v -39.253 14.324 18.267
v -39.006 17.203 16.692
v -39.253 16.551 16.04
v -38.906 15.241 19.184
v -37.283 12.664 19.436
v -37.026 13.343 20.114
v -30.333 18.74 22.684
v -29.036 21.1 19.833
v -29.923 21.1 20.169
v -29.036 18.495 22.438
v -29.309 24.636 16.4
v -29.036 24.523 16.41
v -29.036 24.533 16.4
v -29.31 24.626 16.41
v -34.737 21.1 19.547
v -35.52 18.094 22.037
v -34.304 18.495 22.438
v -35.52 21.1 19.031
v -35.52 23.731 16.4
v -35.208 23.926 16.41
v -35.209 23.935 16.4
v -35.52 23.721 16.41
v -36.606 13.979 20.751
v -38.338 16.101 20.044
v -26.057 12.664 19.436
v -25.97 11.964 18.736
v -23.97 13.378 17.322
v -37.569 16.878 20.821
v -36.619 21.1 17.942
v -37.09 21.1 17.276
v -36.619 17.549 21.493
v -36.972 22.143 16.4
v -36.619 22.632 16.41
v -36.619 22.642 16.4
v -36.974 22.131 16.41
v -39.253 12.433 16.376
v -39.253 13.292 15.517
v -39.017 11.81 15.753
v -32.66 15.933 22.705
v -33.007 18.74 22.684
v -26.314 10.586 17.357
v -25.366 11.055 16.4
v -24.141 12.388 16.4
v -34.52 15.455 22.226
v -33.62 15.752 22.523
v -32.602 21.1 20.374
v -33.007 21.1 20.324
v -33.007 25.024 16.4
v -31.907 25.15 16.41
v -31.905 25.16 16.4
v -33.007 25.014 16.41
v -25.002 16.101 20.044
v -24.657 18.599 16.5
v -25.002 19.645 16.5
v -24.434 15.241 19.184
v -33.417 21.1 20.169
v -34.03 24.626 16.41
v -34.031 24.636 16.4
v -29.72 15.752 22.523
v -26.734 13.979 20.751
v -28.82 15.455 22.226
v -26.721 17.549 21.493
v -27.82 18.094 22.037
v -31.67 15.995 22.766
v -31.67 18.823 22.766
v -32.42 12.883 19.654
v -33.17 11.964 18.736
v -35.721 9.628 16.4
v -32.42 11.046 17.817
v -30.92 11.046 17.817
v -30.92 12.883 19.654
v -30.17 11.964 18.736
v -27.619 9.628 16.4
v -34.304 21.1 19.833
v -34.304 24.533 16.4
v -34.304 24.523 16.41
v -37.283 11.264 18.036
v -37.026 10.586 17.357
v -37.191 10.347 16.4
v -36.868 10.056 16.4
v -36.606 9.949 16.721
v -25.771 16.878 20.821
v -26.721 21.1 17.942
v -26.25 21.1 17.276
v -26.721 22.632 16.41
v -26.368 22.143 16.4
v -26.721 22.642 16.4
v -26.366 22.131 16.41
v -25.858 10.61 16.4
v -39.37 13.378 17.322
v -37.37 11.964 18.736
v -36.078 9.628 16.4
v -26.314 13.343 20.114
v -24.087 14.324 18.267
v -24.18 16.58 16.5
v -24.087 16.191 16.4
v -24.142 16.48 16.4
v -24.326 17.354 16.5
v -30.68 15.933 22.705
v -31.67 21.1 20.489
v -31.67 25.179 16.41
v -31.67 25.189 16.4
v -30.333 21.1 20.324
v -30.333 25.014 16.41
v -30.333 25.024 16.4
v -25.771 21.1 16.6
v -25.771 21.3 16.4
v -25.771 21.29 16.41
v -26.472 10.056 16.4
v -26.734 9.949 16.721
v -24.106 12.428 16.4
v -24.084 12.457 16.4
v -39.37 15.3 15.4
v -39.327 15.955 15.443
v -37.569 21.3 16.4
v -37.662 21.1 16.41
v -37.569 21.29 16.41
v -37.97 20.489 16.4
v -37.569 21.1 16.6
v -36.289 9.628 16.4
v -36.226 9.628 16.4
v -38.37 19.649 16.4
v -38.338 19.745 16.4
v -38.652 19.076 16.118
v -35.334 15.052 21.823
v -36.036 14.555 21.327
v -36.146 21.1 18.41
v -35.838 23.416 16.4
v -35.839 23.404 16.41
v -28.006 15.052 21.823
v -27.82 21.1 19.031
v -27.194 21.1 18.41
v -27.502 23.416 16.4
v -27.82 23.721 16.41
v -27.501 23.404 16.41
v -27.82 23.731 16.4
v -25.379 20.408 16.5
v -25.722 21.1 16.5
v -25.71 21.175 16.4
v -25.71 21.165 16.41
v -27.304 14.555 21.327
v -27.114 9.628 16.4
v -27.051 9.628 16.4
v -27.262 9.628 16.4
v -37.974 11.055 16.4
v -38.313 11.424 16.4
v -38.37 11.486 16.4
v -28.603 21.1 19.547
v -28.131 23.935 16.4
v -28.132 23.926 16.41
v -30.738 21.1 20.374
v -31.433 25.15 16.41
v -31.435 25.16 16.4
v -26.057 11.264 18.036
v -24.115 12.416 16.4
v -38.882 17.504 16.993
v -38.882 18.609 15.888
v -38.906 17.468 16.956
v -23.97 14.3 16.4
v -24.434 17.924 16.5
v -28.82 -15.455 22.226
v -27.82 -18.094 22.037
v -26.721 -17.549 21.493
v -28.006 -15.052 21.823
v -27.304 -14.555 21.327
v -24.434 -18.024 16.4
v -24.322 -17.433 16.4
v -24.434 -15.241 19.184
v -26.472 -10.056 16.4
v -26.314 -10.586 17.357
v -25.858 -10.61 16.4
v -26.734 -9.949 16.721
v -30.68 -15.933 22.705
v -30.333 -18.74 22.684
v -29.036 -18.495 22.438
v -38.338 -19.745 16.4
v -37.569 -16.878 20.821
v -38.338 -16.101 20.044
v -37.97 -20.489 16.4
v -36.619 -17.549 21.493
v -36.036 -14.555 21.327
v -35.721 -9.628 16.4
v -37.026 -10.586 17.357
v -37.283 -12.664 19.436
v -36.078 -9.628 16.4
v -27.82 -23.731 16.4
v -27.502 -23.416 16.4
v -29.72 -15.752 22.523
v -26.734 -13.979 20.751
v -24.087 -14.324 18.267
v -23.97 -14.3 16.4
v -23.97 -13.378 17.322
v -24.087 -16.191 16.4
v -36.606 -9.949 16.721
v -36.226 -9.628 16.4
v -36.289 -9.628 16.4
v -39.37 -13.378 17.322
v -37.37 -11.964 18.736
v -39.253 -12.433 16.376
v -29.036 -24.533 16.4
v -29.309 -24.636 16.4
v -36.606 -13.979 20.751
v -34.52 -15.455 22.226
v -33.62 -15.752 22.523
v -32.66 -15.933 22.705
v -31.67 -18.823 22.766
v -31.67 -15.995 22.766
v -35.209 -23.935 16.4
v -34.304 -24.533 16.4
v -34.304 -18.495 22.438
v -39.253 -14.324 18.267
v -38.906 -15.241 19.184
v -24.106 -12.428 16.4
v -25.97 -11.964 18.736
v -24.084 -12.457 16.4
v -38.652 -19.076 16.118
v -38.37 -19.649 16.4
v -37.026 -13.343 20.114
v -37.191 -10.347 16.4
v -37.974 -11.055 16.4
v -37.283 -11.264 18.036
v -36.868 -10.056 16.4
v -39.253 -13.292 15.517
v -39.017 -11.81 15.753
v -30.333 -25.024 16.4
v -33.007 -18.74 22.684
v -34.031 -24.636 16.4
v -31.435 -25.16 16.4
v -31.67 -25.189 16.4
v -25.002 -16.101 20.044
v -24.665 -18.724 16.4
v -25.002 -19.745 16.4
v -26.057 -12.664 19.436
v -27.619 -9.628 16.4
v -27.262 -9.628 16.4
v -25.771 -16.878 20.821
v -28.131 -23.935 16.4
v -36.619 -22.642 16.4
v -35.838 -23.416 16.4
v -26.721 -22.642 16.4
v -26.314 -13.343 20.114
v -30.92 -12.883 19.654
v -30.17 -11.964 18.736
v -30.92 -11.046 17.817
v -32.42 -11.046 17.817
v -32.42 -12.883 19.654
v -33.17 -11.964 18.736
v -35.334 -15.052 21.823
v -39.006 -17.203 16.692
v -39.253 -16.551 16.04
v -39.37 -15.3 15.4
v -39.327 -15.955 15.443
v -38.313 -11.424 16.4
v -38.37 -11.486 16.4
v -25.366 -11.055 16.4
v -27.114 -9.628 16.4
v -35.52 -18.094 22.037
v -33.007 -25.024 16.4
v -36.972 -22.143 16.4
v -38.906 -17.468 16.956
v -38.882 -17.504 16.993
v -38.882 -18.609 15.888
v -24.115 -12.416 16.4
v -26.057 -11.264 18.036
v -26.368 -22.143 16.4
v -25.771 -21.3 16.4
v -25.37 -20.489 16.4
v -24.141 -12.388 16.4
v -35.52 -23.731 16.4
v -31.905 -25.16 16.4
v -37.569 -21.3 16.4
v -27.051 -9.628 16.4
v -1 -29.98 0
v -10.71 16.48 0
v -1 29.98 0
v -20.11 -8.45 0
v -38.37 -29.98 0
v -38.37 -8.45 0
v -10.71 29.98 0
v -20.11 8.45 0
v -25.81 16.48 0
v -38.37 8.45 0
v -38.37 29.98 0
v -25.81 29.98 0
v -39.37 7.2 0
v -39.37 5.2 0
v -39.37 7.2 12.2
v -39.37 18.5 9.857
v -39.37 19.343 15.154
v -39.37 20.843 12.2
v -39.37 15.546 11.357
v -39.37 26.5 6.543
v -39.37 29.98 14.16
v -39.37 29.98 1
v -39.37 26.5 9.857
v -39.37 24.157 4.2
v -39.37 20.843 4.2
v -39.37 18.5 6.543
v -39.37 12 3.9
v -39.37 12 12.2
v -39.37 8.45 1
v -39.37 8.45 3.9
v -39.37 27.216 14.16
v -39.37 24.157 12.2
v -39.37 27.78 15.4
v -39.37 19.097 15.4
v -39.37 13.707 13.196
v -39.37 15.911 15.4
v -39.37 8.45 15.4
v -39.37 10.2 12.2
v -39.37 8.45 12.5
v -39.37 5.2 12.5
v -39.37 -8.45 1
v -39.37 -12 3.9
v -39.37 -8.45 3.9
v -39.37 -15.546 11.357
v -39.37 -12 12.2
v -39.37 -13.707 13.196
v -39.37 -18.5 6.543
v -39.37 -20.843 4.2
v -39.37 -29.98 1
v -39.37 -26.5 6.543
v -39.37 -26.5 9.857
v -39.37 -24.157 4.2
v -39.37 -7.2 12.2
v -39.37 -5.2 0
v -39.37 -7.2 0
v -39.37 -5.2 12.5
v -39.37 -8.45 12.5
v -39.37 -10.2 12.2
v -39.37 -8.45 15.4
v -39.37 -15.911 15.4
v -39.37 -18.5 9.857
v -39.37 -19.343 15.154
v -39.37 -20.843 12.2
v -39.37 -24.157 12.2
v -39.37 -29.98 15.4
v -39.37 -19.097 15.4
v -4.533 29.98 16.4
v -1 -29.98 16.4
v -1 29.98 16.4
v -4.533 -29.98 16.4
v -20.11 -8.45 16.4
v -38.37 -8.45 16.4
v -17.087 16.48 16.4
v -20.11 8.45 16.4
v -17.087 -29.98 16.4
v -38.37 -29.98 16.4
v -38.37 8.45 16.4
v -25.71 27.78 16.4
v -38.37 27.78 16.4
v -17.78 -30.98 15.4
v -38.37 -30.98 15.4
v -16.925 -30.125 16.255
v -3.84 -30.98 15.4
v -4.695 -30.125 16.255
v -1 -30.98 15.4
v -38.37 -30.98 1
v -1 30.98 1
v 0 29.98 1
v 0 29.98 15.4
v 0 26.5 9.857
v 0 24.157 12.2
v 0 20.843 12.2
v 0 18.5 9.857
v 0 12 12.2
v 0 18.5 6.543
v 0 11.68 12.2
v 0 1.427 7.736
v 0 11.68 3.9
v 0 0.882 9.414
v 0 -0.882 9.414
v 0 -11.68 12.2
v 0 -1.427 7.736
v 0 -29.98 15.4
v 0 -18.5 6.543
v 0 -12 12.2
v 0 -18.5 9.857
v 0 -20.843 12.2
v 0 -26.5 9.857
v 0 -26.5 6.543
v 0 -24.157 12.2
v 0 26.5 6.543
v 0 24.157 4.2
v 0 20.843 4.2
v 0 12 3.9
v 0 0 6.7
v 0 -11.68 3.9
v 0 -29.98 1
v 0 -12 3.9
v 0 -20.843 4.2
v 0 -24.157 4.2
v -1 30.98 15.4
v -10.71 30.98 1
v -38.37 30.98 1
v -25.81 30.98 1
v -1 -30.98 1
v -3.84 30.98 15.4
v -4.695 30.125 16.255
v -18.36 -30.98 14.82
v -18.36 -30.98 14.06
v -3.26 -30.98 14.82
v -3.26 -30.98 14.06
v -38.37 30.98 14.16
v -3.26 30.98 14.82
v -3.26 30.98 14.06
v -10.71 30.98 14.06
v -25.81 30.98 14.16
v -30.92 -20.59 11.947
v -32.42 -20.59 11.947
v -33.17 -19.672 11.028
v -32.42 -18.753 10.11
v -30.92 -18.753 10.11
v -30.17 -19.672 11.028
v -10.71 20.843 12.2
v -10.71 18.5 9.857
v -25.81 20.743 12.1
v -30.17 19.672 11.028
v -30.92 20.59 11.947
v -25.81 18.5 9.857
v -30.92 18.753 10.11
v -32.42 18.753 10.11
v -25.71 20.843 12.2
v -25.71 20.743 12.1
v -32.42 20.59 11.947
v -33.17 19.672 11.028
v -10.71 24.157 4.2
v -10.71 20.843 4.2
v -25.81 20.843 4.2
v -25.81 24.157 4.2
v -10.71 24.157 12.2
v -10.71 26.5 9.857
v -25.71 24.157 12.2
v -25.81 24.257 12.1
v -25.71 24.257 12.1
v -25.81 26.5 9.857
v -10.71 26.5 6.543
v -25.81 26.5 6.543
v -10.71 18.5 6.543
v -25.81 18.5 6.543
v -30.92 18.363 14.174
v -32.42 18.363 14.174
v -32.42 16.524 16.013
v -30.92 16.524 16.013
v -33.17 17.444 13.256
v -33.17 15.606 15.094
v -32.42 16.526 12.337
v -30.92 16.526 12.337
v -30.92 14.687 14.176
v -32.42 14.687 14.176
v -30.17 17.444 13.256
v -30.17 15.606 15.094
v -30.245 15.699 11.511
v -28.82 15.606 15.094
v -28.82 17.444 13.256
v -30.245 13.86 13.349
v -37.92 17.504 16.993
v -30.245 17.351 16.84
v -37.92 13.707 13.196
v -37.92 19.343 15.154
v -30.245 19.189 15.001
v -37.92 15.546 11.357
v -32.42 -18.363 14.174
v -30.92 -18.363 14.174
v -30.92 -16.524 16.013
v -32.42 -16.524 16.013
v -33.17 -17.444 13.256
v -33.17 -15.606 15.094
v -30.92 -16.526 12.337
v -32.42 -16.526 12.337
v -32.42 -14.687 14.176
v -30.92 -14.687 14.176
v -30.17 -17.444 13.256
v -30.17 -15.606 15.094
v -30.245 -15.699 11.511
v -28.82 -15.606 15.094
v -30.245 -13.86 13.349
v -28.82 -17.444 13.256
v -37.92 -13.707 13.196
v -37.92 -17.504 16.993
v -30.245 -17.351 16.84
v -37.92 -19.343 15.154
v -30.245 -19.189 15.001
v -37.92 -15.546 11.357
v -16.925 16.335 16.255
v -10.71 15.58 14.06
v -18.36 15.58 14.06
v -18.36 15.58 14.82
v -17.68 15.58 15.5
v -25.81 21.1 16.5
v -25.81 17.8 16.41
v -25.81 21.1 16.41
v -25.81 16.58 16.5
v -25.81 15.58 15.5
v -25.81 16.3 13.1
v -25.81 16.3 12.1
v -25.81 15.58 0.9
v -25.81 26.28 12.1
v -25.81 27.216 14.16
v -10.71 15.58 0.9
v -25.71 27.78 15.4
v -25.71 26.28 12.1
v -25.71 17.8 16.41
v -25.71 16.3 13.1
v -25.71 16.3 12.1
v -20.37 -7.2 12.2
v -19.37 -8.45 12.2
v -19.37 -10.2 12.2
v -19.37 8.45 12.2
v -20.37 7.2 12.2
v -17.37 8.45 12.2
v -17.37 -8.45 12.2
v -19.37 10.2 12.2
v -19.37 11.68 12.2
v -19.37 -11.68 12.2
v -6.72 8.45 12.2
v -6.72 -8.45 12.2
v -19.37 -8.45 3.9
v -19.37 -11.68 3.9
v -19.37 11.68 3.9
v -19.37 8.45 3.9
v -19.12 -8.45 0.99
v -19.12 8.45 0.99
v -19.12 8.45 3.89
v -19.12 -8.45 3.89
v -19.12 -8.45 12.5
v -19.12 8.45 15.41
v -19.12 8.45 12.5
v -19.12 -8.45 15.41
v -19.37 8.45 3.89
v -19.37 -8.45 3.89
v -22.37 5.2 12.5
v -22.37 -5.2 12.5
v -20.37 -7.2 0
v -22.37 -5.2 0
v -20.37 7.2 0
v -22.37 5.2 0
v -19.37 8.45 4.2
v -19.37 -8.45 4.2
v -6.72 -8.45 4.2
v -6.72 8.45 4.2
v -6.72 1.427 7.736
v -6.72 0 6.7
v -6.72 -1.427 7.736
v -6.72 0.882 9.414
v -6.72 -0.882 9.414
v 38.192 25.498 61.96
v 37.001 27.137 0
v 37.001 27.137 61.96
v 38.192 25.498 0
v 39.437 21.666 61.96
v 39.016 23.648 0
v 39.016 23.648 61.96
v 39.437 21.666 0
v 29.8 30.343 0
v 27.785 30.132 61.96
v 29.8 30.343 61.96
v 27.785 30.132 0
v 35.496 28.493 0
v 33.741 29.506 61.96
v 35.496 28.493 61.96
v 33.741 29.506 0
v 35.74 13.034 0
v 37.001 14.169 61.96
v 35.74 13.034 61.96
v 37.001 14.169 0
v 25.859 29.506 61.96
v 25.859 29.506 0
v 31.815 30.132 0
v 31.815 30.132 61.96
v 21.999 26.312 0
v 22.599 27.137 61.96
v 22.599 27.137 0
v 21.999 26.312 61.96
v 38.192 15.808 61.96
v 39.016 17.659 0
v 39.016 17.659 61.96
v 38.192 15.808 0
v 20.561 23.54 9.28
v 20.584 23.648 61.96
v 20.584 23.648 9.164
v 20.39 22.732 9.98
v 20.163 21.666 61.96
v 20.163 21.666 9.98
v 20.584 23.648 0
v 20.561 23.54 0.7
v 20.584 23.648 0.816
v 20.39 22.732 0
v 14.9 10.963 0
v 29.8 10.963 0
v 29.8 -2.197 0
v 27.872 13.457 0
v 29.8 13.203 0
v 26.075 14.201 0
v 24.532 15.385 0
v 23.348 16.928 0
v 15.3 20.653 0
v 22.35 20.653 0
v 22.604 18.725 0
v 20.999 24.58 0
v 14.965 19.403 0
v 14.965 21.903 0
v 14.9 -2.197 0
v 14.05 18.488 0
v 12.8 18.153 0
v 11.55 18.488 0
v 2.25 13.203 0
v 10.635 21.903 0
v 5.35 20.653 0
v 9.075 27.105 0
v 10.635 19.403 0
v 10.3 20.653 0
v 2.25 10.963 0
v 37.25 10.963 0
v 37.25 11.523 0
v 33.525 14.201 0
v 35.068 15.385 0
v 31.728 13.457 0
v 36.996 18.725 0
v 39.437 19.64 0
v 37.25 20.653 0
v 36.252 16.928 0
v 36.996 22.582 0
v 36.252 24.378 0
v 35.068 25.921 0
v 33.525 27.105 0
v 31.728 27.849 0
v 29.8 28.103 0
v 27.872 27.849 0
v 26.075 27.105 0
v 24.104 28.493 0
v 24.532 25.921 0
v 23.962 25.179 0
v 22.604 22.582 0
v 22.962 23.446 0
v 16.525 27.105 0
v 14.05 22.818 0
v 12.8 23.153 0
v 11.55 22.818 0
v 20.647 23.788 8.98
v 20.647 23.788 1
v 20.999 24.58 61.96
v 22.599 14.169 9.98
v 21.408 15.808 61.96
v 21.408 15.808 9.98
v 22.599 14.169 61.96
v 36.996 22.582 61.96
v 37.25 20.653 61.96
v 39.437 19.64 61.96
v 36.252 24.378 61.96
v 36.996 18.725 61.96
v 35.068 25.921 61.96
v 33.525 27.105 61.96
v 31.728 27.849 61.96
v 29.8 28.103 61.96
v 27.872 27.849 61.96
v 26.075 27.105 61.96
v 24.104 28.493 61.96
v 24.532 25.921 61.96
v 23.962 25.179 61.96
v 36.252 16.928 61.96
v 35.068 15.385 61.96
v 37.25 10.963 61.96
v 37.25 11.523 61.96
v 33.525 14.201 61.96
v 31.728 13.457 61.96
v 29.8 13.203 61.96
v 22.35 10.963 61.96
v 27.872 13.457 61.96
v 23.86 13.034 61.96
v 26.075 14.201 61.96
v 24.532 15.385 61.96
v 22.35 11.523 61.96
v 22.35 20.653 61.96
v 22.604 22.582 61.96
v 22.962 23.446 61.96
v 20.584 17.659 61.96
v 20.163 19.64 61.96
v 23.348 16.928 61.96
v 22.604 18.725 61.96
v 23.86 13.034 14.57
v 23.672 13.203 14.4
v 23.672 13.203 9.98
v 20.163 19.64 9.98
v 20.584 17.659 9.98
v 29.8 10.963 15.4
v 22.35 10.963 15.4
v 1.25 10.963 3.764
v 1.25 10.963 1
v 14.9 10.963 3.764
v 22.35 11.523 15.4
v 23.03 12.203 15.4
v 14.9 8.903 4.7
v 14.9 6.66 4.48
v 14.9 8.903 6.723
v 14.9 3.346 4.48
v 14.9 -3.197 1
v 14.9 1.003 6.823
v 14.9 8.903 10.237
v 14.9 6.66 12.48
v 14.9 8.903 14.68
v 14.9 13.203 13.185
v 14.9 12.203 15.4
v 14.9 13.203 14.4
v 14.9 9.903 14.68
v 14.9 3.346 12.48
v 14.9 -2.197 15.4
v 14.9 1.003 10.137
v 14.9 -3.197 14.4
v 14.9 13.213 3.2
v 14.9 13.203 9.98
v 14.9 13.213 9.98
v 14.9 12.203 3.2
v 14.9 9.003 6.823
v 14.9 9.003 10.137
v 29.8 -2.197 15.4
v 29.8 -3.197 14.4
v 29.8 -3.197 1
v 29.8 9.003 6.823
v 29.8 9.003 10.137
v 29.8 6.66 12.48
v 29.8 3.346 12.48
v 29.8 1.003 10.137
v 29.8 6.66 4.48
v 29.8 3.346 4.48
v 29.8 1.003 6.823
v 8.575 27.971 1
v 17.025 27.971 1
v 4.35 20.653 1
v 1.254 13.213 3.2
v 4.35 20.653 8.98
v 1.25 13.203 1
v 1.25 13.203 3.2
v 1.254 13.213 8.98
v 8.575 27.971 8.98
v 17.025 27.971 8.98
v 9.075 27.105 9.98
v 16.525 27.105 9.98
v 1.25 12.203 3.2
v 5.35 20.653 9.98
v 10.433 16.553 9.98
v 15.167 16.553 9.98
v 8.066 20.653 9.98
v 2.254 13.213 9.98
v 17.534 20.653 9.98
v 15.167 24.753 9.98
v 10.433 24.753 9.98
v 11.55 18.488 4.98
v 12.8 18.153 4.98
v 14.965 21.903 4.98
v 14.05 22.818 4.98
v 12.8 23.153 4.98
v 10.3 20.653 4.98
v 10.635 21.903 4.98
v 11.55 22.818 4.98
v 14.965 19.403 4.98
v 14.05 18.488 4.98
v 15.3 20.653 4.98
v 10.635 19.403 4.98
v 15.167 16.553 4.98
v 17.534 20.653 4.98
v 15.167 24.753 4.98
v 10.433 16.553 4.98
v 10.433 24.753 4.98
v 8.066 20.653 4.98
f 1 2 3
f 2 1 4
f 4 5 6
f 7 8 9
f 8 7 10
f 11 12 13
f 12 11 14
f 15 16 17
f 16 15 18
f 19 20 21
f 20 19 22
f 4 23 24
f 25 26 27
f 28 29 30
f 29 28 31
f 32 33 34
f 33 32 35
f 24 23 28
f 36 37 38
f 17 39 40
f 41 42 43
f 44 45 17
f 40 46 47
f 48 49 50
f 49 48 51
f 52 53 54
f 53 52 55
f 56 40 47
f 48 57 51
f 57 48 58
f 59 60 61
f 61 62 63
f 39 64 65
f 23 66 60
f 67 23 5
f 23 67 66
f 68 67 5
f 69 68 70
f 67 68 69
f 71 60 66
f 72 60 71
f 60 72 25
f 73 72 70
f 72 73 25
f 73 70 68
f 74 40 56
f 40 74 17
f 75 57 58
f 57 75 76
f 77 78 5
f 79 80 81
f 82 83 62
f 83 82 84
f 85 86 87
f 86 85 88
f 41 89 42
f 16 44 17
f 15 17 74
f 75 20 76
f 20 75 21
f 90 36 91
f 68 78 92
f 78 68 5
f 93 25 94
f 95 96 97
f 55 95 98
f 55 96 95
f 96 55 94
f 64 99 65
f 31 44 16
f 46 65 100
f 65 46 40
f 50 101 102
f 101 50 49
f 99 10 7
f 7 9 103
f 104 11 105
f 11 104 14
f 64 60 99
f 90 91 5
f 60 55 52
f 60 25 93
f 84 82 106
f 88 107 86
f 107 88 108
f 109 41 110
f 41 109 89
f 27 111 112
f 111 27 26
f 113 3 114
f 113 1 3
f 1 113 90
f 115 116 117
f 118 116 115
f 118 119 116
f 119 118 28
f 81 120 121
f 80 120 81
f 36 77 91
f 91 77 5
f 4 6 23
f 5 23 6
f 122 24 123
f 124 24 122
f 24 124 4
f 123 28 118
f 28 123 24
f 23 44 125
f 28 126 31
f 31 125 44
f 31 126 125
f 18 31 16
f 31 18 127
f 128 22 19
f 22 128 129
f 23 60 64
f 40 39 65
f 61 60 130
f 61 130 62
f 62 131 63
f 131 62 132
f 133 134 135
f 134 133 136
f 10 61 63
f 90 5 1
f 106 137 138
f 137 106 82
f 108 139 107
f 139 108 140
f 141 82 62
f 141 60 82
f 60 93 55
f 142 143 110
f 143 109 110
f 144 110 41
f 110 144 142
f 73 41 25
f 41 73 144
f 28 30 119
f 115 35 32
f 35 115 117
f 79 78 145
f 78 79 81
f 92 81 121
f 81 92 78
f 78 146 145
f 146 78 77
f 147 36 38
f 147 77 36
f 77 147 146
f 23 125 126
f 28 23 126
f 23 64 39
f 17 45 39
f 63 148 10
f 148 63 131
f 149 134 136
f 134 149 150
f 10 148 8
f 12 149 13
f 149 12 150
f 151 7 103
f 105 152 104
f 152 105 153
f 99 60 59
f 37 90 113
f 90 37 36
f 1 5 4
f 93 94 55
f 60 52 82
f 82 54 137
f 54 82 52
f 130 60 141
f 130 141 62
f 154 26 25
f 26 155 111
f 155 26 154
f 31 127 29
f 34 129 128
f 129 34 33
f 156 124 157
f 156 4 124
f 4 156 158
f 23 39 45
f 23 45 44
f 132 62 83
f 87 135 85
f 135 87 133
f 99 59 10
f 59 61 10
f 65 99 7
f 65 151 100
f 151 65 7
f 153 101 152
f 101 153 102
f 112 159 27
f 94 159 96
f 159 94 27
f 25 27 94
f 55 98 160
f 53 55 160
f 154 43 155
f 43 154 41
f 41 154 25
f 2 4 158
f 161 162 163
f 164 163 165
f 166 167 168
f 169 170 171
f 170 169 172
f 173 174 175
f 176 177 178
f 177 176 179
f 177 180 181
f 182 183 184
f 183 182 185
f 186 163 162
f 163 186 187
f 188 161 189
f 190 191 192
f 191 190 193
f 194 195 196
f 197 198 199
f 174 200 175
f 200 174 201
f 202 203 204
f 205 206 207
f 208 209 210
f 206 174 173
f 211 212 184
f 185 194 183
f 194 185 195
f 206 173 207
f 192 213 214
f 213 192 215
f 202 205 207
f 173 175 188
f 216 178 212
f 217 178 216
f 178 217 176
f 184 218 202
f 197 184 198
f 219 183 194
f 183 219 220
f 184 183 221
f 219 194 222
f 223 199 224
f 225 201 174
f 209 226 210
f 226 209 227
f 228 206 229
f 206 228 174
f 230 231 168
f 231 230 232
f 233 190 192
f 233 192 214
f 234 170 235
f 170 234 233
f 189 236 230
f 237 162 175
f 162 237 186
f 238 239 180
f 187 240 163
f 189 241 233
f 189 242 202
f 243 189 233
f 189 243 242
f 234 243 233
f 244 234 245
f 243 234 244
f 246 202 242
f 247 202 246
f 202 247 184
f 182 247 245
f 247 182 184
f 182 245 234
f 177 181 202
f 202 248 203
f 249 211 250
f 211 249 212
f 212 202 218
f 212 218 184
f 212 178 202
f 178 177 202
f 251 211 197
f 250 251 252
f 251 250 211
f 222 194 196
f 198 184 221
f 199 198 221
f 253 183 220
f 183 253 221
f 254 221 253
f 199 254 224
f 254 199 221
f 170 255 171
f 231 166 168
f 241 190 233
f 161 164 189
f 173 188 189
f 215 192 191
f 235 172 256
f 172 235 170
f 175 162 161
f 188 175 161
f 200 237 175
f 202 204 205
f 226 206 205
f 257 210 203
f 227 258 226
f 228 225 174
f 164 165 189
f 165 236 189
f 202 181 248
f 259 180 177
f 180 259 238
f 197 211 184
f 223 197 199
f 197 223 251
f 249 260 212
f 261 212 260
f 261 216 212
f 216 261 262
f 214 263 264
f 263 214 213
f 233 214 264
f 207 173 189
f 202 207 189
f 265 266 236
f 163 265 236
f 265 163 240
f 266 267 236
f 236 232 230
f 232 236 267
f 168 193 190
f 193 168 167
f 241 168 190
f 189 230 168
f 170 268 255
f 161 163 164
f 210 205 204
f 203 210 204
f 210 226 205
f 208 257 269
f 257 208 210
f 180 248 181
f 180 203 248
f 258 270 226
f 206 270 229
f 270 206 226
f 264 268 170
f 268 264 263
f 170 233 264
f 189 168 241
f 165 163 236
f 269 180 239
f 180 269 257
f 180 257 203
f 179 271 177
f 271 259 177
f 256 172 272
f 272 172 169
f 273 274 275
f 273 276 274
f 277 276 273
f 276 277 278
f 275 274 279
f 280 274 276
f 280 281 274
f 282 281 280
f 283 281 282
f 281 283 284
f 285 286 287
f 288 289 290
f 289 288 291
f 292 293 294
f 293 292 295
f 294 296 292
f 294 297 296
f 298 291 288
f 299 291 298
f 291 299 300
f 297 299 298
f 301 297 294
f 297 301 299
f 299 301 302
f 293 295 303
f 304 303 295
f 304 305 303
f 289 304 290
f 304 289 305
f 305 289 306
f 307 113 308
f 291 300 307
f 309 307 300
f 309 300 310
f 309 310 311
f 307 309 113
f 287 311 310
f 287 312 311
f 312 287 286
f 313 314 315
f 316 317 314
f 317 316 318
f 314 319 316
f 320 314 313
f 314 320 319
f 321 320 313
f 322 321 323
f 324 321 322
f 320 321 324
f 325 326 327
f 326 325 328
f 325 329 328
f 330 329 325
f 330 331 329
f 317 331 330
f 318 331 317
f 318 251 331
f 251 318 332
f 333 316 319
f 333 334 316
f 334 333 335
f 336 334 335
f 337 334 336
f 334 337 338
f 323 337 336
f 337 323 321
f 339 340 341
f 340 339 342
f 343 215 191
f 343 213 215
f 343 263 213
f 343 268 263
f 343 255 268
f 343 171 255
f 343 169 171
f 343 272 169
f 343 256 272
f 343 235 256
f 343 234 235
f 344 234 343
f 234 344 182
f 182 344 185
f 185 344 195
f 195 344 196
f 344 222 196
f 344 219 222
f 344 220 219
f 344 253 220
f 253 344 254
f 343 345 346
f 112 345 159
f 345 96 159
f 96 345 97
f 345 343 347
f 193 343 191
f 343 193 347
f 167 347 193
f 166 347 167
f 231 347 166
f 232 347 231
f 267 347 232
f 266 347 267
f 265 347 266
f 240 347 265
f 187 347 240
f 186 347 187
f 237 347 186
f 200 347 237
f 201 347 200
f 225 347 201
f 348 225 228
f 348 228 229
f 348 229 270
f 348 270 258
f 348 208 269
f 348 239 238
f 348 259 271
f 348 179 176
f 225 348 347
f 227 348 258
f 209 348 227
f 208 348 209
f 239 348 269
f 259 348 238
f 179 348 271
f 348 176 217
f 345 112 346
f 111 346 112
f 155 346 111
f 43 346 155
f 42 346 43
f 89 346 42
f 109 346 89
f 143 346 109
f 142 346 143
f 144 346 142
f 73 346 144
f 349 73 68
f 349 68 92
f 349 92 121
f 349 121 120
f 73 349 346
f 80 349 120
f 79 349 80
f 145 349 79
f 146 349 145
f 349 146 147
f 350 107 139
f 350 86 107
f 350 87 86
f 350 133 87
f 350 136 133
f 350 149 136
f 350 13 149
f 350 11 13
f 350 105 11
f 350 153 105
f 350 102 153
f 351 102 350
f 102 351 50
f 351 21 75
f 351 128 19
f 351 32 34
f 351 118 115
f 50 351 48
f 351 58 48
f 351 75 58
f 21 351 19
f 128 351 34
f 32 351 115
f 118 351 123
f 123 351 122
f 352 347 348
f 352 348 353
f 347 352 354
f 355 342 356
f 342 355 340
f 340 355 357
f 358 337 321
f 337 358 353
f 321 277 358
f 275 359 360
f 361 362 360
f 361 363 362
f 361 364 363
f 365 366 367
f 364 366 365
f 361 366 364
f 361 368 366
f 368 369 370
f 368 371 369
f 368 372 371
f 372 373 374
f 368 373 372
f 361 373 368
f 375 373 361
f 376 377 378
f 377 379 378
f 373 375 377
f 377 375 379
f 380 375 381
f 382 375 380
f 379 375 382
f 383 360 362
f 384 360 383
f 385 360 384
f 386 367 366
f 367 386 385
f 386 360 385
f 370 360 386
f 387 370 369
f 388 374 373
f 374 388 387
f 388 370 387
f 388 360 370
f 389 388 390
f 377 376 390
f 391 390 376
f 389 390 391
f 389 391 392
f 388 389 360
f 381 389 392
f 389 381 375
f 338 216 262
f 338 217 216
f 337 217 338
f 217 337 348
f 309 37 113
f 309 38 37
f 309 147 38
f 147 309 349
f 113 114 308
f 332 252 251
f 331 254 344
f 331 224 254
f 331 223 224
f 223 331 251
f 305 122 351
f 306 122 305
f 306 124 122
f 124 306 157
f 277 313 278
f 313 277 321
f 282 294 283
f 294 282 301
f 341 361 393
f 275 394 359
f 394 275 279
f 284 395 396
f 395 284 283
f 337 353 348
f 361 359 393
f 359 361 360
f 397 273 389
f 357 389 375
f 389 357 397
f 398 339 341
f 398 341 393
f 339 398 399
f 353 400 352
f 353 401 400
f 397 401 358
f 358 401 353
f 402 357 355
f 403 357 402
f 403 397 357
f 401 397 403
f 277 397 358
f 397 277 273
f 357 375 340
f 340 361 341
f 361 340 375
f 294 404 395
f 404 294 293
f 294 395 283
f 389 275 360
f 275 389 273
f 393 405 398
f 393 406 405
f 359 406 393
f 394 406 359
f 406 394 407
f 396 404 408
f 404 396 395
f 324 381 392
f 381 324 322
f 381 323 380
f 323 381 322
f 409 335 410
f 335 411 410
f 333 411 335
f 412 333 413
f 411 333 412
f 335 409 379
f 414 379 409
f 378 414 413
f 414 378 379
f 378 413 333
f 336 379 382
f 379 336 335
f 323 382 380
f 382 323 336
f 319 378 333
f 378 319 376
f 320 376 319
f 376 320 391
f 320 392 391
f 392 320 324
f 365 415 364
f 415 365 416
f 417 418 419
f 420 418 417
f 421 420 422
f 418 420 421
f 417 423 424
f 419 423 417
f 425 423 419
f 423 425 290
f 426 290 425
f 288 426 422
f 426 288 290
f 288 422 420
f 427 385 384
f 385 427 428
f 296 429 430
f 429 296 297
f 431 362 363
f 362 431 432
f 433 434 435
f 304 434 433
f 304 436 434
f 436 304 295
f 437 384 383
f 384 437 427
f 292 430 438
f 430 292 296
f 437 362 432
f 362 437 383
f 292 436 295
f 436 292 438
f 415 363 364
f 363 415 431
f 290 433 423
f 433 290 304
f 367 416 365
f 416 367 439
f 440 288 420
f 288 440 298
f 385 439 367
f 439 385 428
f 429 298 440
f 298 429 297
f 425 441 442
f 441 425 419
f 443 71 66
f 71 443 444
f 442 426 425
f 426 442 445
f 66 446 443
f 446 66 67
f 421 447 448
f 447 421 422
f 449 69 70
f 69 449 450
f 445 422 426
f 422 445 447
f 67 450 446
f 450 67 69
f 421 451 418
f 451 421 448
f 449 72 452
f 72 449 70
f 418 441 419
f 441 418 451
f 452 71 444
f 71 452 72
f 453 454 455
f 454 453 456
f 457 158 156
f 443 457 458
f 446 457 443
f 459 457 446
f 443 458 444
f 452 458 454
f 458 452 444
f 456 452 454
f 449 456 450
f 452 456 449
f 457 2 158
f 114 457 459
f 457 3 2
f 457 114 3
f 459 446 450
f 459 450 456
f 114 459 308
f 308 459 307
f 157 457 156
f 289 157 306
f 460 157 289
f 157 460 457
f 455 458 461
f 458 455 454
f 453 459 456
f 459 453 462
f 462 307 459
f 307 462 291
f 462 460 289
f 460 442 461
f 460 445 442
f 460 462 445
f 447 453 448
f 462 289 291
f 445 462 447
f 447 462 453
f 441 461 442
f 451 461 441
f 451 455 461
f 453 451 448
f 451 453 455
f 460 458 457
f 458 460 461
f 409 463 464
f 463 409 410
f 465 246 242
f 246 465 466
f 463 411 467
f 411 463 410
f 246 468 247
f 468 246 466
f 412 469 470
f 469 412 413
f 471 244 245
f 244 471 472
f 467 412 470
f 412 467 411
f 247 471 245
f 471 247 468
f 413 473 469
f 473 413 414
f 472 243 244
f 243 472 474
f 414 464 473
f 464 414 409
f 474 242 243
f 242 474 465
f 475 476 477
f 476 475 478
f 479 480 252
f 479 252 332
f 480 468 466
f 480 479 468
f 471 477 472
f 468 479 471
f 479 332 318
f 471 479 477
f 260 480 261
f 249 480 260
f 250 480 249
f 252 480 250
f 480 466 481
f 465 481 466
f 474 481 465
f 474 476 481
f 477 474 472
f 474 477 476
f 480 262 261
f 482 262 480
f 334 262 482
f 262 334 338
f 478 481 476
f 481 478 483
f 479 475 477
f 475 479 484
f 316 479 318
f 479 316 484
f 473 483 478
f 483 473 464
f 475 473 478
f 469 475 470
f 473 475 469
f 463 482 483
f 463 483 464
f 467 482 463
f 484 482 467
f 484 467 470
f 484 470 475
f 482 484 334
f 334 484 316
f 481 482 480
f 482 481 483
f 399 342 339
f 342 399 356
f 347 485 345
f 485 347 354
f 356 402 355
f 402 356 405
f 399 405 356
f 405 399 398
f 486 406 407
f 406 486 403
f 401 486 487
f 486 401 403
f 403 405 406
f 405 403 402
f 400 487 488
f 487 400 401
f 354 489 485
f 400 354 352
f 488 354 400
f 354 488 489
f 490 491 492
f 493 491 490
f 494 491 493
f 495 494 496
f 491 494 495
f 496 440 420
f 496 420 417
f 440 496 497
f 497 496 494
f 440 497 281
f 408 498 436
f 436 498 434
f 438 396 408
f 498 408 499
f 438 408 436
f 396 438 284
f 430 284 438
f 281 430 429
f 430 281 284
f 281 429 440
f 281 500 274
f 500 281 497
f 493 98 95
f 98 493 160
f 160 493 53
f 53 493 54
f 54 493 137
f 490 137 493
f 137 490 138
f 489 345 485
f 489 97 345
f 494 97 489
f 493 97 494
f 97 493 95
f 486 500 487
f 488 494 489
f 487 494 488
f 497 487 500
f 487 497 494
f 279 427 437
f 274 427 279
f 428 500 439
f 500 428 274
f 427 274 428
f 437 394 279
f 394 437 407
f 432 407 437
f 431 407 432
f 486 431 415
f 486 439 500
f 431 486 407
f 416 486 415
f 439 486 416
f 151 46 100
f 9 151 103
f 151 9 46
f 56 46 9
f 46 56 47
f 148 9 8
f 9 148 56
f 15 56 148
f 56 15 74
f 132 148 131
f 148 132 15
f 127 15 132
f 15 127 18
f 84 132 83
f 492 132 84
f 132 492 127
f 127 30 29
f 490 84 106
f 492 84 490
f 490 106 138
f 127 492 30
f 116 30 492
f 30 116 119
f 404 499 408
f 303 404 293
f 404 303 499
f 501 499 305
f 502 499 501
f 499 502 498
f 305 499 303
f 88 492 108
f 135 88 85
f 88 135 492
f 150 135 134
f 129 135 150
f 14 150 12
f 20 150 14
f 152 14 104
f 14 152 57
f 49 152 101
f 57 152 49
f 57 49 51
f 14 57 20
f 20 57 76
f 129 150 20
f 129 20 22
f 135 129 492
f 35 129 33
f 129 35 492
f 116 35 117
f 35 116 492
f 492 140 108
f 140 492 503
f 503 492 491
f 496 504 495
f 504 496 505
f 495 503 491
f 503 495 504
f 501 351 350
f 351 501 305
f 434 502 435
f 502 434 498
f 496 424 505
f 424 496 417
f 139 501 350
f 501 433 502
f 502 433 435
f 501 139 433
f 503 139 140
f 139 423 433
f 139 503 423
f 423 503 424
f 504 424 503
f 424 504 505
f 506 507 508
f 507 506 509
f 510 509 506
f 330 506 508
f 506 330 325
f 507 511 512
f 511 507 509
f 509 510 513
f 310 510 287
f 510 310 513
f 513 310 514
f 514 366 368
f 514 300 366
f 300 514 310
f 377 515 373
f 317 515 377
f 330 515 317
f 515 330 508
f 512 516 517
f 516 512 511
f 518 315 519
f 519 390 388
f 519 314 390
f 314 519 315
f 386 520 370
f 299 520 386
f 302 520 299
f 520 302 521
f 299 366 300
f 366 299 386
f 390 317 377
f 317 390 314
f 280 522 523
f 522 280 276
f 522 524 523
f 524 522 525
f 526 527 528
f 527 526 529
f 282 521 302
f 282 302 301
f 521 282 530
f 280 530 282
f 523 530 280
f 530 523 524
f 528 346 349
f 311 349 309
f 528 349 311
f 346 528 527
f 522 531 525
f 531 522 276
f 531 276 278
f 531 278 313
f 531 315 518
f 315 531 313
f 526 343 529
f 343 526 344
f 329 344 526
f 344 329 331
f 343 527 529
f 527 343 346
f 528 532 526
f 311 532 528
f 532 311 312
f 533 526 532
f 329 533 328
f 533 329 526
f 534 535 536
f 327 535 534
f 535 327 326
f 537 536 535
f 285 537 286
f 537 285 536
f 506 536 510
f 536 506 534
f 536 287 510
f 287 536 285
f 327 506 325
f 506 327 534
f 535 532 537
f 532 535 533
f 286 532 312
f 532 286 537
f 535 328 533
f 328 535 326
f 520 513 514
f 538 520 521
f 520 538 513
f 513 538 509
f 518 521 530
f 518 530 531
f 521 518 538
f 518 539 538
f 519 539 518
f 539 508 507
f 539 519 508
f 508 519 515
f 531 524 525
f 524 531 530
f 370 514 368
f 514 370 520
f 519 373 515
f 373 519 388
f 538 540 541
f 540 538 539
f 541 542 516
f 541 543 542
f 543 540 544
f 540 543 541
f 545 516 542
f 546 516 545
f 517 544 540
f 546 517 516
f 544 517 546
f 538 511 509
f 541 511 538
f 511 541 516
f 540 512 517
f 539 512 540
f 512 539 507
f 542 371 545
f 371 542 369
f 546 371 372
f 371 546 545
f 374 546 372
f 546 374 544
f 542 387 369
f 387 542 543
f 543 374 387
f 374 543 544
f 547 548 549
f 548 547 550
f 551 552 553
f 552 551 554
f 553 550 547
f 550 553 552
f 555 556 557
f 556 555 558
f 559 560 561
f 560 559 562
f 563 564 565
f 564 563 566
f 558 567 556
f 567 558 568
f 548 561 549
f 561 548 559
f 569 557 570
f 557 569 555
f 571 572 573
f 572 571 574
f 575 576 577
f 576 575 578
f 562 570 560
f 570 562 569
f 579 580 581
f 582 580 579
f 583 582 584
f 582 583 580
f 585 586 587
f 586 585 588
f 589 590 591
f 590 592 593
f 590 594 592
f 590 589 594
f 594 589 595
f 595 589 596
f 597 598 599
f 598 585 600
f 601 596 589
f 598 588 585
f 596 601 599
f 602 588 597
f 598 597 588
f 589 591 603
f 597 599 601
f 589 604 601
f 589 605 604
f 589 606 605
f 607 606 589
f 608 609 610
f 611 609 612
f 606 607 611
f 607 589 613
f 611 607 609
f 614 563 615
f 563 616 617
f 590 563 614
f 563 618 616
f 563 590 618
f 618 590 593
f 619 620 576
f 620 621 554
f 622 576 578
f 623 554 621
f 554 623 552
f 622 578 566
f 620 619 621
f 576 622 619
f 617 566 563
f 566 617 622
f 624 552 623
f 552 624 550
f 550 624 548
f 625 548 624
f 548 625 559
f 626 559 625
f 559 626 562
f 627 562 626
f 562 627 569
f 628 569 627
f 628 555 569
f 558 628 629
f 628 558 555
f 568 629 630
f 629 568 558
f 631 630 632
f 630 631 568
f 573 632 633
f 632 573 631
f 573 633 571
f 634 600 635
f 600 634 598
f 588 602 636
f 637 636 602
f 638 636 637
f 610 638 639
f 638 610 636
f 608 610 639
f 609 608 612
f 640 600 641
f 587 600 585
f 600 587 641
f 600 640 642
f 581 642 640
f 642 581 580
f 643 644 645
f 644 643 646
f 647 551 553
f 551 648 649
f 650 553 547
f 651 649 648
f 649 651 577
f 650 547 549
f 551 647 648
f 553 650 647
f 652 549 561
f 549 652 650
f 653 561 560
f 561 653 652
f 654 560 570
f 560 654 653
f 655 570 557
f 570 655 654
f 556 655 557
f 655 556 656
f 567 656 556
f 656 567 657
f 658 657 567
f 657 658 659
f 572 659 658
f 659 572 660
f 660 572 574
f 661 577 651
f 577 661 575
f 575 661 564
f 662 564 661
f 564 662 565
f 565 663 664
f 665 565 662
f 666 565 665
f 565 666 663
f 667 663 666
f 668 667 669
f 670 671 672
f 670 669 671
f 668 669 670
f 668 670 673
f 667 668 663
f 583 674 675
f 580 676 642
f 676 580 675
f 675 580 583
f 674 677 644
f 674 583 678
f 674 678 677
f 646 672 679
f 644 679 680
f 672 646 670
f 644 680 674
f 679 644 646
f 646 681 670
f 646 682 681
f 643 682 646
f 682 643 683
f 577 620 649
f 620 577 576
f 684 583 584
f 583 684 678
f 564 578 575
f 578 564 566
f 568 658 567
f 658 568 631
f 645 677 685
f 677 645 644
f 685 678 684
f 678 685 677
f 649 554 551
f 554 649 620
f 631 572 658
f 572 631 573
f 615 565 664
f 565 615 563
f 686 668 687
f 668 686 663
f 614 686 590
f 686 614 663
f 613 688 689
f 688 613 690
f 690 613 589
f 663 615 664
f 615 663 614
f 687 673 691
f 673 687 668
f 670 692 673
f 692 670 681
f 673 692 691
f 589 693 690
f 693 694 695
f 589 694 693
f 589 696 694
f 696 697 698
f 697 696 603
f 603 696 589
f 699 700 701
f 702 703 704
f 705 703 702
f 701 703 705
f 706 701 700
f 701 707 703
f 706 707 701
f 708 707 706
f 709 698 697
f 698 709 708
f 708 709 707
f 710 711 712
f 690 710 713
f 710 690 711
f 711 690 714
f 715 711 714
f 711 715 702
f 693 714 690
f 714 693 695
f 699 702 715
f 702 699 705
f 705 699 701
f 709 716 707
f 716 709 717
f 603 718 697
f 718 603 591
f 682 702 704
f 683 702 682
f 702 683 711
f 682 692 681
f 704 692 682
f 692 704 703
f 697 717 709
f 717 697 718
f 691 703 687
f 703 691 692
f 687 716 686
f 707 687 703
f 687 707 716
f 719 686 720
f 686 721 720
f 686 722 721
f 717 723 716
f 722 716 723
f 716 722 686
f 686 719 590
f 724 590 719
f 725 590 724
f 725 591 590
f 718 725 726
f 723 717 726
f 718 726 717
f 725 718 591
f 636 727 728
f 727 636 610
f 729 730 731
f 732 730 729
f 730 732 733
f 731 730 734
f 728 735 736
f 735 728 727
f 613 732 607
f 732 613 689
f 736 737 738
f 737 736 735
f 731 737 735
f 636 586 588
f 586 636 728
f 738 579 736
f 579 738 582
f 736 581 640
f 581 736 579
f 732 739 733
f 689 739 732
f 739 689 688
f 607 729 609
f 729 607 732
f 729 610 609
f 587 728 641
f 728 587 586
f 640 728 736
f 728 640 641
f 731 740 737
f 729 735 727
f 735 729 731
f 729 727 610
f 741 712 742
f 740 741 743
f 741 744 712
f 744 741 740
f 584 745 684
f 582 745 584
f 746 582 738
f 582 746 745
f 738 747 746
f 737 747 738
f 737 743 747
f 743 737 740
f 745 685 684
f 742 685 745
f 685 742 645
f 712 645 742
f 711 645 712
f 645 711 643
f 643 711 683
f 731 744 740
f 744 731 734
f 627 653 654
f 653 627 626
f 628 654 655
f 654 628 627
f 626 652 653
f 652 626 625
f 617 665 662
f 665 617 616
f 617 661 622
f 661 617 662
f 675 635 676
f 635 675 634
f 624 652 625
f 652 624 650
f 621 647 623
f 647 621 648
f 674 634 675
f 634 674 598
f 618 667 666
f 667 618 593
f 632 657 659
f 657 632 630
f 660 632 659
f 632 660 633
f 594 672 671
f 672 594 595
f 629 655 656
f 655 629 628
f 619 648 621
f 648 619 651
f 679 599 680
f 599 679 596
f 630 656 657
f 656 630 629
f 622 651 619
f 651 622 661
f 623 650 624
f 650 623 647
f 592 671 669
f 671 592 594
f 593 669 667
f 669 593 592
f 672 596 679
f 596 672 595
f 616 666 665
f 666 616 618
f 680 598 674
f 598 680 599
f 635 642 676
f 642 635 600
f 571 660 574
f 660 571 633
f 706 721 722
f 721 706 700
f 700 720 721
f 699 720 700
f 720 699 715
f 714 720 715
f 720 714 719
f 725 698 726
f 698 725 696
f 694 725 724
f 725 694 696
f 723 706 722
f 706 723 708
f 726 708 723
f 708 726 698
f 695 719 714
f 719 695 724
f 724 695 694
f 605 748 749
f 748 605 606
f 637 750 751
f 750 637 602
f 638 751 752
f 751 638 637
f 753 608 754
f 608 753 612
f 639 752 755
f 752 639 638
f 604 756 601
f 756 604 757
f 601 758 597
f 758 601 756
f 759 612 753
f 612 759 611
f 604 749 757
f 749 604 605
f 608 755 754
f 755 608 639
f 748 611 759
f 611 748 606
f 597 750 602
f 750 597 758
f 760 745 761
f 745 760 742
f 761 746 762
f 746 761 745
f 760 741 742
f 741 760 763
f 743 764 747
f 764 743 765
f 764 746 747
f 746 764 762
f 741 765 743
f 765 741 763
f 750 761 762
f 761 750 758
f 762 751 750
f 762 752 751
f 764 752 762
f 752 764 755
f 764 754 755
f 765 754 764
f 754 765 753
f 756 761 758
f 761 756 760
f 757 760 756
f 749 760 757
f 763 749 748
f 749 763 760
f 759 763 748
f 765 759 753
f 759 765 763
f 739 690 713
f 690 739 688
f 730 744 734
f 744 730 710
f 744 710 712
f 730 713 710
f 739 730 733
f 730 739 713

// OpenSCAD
//////////////////////////////////////////////////////////////////////////////////////
///
///  I3XENDS - Split X-Ends for Prusa i3, with Endstop and Belt Tensioner
///
///  This file contains a redesign of the X-ends for the Prusa i3, including
///  motor end, idler end with belt tensioner and endstop.
///
///  The design goal is to make the X-ends stronger by splitting them into two
///  interlocking parts, printing the Z-axis related part vertically and the
///  X-axis relating part rotated 90 degrees to the back.  This way, each part
///  is printed in its optimal position, resulting in improved object strength
///  and reduced printing difficulties, such as warping and cracking. The two
///  part are joined by means of a trapezoidal slide and are locked firmly
///  together once the upped X-rod is inserted.
///
///  The idler bearing is mounted on a configurable fork which also acts as a
///  belt tensioner, being attached to the left X-end by means of an ajuster bolt.
///  Idler forks for the following bearing are predefined:
///     2x623ZZ, 2x604ZZ, 2x624Z, 2x625ZZ, 1x608ZZ
///
///  The motor X-end contains has the option for integrating a Z-endstop adjustment
///  screw.
///
///  Finally, the X-endstop holder is implemented a separate object which slides
///  on boths X-rods and is maintained firmly in its position bt means of two locking
///  screws.
///
///  The rod channels and screw holes are defined to be tight.  Use a drill with
///  the corresponding diameter to obtain perfectly fitting cavities.
///
//////////////////////////////////////////////////////////////////////////////////////
///
///  2014-10-24 Heinz Spiess, Switzerland
///
///  released under Creative Commons - Attribution - Share Alike licence (CC BY-SA)
//////////////////////////////////////////////////////////////////////////////////////

// extrusion specific parameters
ew = 0.56;    // extrusion width
eh = 0.3;    // layer height
epsgap = 0.1; // gap between complementing parts
wall = [6*ew, 8*ew, 14*eh, 4*ew]; // wall thickness x/y/z/lm8uu


// build a cube with chamfered edges
module chamfered_cube(size,d=[1,1,1]){
   hull(){
     translate([d[0],d[1],0])cube(size-2*[d[0],d[1],0]);
     translate([0,d[1],d[2]])cube(size-2*[0,d[1],d[2]]);
     translate([d[0],0,d[2]])cube(size-2*[d[0],0,d[2]]);
   }
}


// build a cylinder with chamfered edges
module chamfered_cylinder(r=0,r1=0,r2=0,h=0,d=1){
   hull(){
      translate([0,0,d])cylinder(r1=(r?r:r1),r2=(r>0?r:r2),h=h-2*d);
      cylinder(r1=(r?r:r1)-d,r2=(r>0?r:r2)-d,h=h);
   }
}


//////////////////////////////////////////////////////////////////////////////////////
///
///  The module i3_xend() contains all parts of the project as sub-modules. 
///  (This is convenient since this way, the parameters can easily be shared.)
///
//////////////////////////////////////////////////////////////////////////////////////
module i3_xend(motorend=true, idlerend=false, idler=false, bearing=[5,17,11], endstop=false, zcarriage=true, support=true, idlerclamps=false){
xdist = 45;   // distance between x-rods
xrod = 8;     // diameter of x-rods
lm8uu = 14.9;   // diameter of linear bearing;


motor_d = 42; // motor side length (Nema 17)
motor_s = 31; // motor mounting screws spacing

madj = 2.5;   // screw hole for adjuster screw (cut thread with M3 tap)
m3 = 3;       // motor screw diameter
m3n = 5.5;    // M3 nut diameter
m3nh = 2.5;   // M3 nut height
m5 = 5;       // threaded z-rod diameter
m5n = 8.2;    // nut size on threaded x-rod (not too tight!)
m5nh = 5;     // nut height on threaded x-rod
zsrod = 8;    // diameter of smooth z-rod
ztrod = 5;    // diameter of threaded z-rod
zdist = motor_d/2-zsrod/2; // center-to-center distance between z-rods

idl = 20;     // idler length
idg = 0.25;   // gap for idler
ids = m3;      // idler tensioning screw diameter
idn = m3n;    // idler nut diameter
idnh = m3nh;   // idler nut height

xgap = 10-wall[0]-(lm8uu-xrod)/2;    // gap between x-motor and wall

esl = 15;     // endstop length (along x-rods)
esd = 9.5;    // endstop switch screw distance

//  don't change the following, they are just to make code more readble
ml1 = motor_d+xgap;                    // upper length of motor end left of origin
ml2 = lm8uu/2+2*wall[0]+zdist+m5n;      // length of motor end right of origin
ml3 = motor_d/2-motor_s/4-m3+xgap;      // lower length of motor end left of origin
mlz = wall[0]+lm8uu/2;                  // x-position of smooth zrod
d1 = 2*wall[2]+xrod;                    // height of main body
d2 = wall[2]+xrod-1;                    // height of motor base
h1 = xdist+2*wall[1]+xrod;              // total height

itl = ml2-idl-2*wall[0];                // idler tail length
idh = d1;     // idler height
ith = d1;                               // idler tail height
idd = d1;   // idler depth
idc = d1-1;
idca = -45;


///////////////////////////////////////////////////////////////////////////////
// local module for the interlocking Z-carriage part for motor and idler end
///////////////////////////////////////////////////////////////////////////////
module zcarriage(hole=true,l=h1,eps=0){
   translate([0,0,-eps])difference(){
      union(){
         // outer cylinder for linear bearing holder
         cylinder(r=lm8uu/2+wall[3]+eps,h=l+2*eps);
	 // locking rail
         hull(){
            translate([-lm8uu/2-wall[3]-eps,-lm8uu/2-eps,0])cube([ew+2*eps,lm8uu+2*eps,l+2*eps]);
            translate([-lm8uu/2-eps,-lm8uu/2+wall[3]-eps,0])cube([ew+2*eps,lm8uu-2*wall[3]+2*eps,l+2*eps]);
         }
	 // upper x-rod lock
         translate([-lm8uu/2-d1-eps,-lm8uu-eps,0-eps])chamfered_cube([d1+2*eps,lm8uu+2*eps,d1-1+2*eps],[1,0,1]);
	 // nut holder for threaded z-rod
	 hull(){
	   translate([0,-zdist,0])rotate(30)chamfered_cylinder(r=lm8uu/2+1,h=h1/2-motor_d/2,$fn=6);
	   translate([-lm8uu/2-wall[3],-ml2+mlz-eps+0.01,0])chamfered_cube([wall[3],ml2-mlz+2*eps,h1/2-motor_d/2],[0,1,1]);
	 }
      }
      // lock for nut holder
      hull(){
         translate([-lm8uu/2-wall[2]-0.1,-ml2+mlz,wall[2]+0.5+eps])cube([1,ml2-mlz-lm8uu,h1/2-motor_d/2],[0,1,1]);
         translate([-lm8uu/2-1,-ml2+mlz-1,wall[2]-1+eps])cube([1.01,ml2-mlz-lm8uu+1,h1/2-motor_d/2],[0,1,1]);
      }
      // cavities
      if(hole){
         // cavity for linear bearings
         translate([0,0,-1])cylinder(r=lm8uu/2,h=l+2);
	 // longitudinal cutout to allow flexing
         rotate(210)translate([-1,0,-1])cube([2,lm8uu/2+wall[3]+0.1,l+2]);
	 // x-rod hole throu x-rod lock
         translate([-lm8uu/2-d1/2,1,wall[1]+xrod/2])rotate([90,0,0])rotate(22.5)cylinder(r=xrod/2/cos(22.5),h=lm8uu+2,$fn=8);
	 // hole for threaded z-rod
	 //%color("grey")translate([0,-zdist,-1])cylinder(r=m5/2,h=h1+2,$fn=12);
	 translate([0,-zdist,-1])cylinder(r=m5/2,h=h1/2-motor_d/2+2,$fn=12);
	 // nut cavity for threaded z-rod
	 translate([0,-zdist,h1/2-motor_d/2-m5nh])rotate(30)cylinder(r=m5n/2/cos(30),h=m5nh+1,$fn=6);
      }
   }
}


///////////////////////////////////////////////////////////////////////////////
// local module to build the base of the motor end
///////////////////////////////////////////////////////////////////////////////
module motorend(){
difference(){
union(){
difference(){
   union(){
      // main body upper part
      hull(){
         translate([-ml1,-1,0])
            chamfered_cube([ml1+ml2,h1/2+1,d2]);
         translate([-ml3,-1,0])
            chamfered_cube([ml3+ml2,h1/2+1,d1]);
      }
      // main body lower part
      translate([-ml3,-h1/2,0])
         chamfered_cube([ml3+ml2,h1/2+2,d1]);
      // z-adjuster screw base
      if(endstop)
         hull()for(xz=[[0,d1/2,6],[0,d1+lm8uu/2,36],[10,d1-5,6]])
            translate([-motor_d/2-xgap+motor_s/2+xz[0],-h1/2,xz[1]])rotate([-90,0,0])
               chamfered_cylinder(r=motor_s/2-motor_s/4-m3,h=h1/2-motor_d/2,$fn=xz[2]);

   }

   for(sy=[-1,1])scale([1,sy,1]){
      // x-rod holes
      translate([0,xdist/2,d1/2])rotate([0,90,0])rotate(22.5)cylinder(r=xrod/2/cos(22.5),h=ml2+1,$fn=8);
      // holes for motor screws
      for(fx=[-1,1])translate([-xgap-motor_d/2+fx*motor_s/2,motor_s/2,-1]){
         // main screw holes
         cylinder(r=m3/2,h=d2+1,$fn=6);
         // cavities for screw heads
	 translate([0,0,7]) cylinder(r=m3,h=d1+2,$fn=12);
      }
   }
   
   // main belt channel 
   translate([-motor_d-xgap-1,-motor_d/4,wall[2]])
      cube([motor_d+xgap+ml2+2,motor_d/2,xrod]);
   hull(){
      translate([-xgap-wall[0],-motor_d/4,wall[2]])
         cube([xgap+ml2+2,motor_d/2,xrod]);
      translate([0,-motor_s/2+2,wall[2]])
         cube([ml2+2,motor_s-4,xrod]);
   }
   // upper motor cavity
   translate([-motor_d-xgap-1,-motor_d/2,d2])
      cube([motor_d+xgap,motor_d,wall[2]+2]);
   //main cutout for motor
   translate([-motor_d-xgap-1,-motor_d/4,-1])
      cube([motor_d,motor_d/2,wall[2]+xrod+2]);
   // octogonal cutout centered on motor axis
   translate([-xgap-motor_d/2,0,0])hull()for(a=[0,90])rotate(a)
      cube([motor_d/2,motor_s-2,motor_d],true);

    // Z-adjuster screw hole
    if(endstop)
       translate([-motor_d/2-xgap+motor_s/2,-h1/2,d1+lm8uu/2])rotate([-90,0,0])
          translate([0,0,-1])cylinder(r=madj/2,h=h1/2+wall[1]-motor_d/2+2,$fn=6);
}
 
    // belt separating wall 
    translate([0,-wall[1]/2,0])chamfered_cube([ml2,wall[1],d1]);
}
   // cutout for linear bearings holder
    translate([wall[0]+lm8uu/2,h1/2,d1+lm8uu/2])rotate([90,0,0])
       rotate(90){
          zcarriage(hole=false,eps=epsgap);
          if(!support)%color("cyan")zcarriage(hole=true);
       }

}

    if(zcarriage)translate([-motor_d+xgap,0,0])rotate(90)
       zcarriage(hole=true);
}

///////////////////////////////////////////////////////////////////////////////
// local module to build the idler fork for the specified bearing parameters
//    bearing[0]   inner diameter (axis)
//    bearing[1]   outer diameter (incl. belt)
//    bearing[2]   width of bearing (incl. washers)
///////////////////////////////////////////////////////////////////////////////
module idler(){
   assign(idD = bearing[2]+2*wall[2])
   assign(idE = bearing[1]/2)
   difference(){
      union(){
         // main body
	 hull(){
            translate([0,-idd/2,0])chamfered_cube([idl,idd,idh]);
            translate([-idE-2,-idD/2,0])chamfered_cube([idl/2+idE,idD,idh]);
	    // front end
            translate([-idE+1,-idD/2,idh/2])rotate([-90,0,0])rotate(0)chamfered_cylinder(r=idh/2,h=idD);
	 }
	 // tail
         translate([0,-idd/2+wall[2]+epsgap,0])chamfered_cube([ml2-2*wall[0],idd-2*wall[2]-2*epsgap,idh]);
      }
      // hole tensioning screw
      translate([-1,0,d1/2])rotate([0,90,0])rotate(30)cylinder(r=ids/2,h=ml2+2,$fn=6);
      // axis hole
      translate([-idE+bearing[0]/2,-idD/2-1,d1/2])rotate([-90,0,0])cylinder(r=bearing[0]/2,h=idD+2);
      hull(){
         // bearing cavity 
         translate([-idE+2,-bearing[2]/2,d1/2])rotate([-90,0,0])cylinder(r=max(bearing[1],idh/cos(30)+2)/2,h=bearing[2]);
         // main cavity
         translate([-idd-1,-idd/2+wall[1],-1])chamfered_cube([idd+idl-wall[0]+1,idd-2*wall[1],idh+2]);
      }
      // tensioning nut cage
      hull()for(y=[0,xrod])translate([(idl+ml2-3*wall[1])/2,y,d1/2])rotate([0,90,0])
         rotate(30)cylinder(r=idn/2/cos(30)+(y?0.4:0),h=idnh,$fn=6);
   }
     
}

///////////////////////////////////////////////////////////////////////////////
// local module to build the idler X-end
///////////////////////////////////////////////////////////////////////////////
module idlerend(){
   difference(){
      union(){
         // main body
         translate([0,-h1/2,0]) chamfered_cube([ml2,h1,d1]);
	 // idler clamp screws
	 if(idlerclamps)for(sy=[-1,1])scale([1,sy,1]){
	     translate([ml2-idc/2,-xdist/2,d1/2])rotate([idca,0,0])chamfered_cylinder(r=idc/2,h=d1/2+m3nh+wall[2],d=2,$fn=36);
	 }
      }
   
      for(sy=[-1,1])scale([1,sy,1]){
         // x-rod holes
         translate([-1,xdist/2,d1/2])rotate([0,90,0])rotate(22.5)cylinder(r=xrod/2/cos(22.5),h=ml2+2,$fn=8);
      }
      
      // idler clamp screw
      if(idlerclamps)for(sy=[-1,1])scale([1,sy,1])
         translate([ml2-idc/2,-xdist/2,d1/2])rotate([idca,0,0]){
           // idler clamp screw head cavity (if needed)
	   cylinder(r=m3/2,h=d1/2+m3nh+wall[2]+3,$fn=6);
           // idler clamp screw holes
	   translate([0,0,d1/2+m3nh+wall[2]+0.01])cylinder(r=m3,h=d1/2+m3nh+wall[2]+3,$fn=12);
           // idler clamp screw nut traps
	   hull()for(x=[0,idc/2+.1])translate([x,0,xrod/2+wall[2]-1-epsgap/2])
	      cylinder(r=m3n/2+(x?0.35:epsgap),h=m3nh+epsgap,$fn=6);
      }
      // main belt channel 
      translate([-1,-motor_s/2+(idlerclamps?3.5:2),wall[2]-eh])
         cube([ml2+2,motor_s-(idlerclamps?7:4),xrod+eh]);
   
      // idler cut-out
      translate([ml2-idl-idg,-idh/2-idg,-0.01])chamfered_cube([idl+10,idh+2*idg,d1+0.02],[1,0,1]);
   
 
      // cutout for linear bearings holder
      translate([wall[0]+lm8uu/2,h1/2,d1+lm8uu/2])rotate([90,0,0])
         rotate(90){
            zcarriage(hole=false,eps=epsgap);
            if(!support)%color("cyan")zcarriage(hole=true);
         }
   }
   // idler support structure (cut away after printing!)
   if(support)color("red")difference(){
      union(){
         translate([ml2-idl-2,-idh/2-2,d1-wall[2]])cube([idl+2,idh+4,eh]);
         translate([ml2-idl+1,-idh/2+1,0])cube([idl-1,idh-2,d1-wall[2]]);
      }
      translate([ml2-idl+1+2,-idh/2+1+2,-1])cube([idl-1,idh-2-4,d1-wall[2]+2]);
   }else{  // draw idler
      %color("green")translate([ml2+5,idd/2,idh/2])rotate([90,0,0])rotate(180)idler();
   }

   // tail cage for idler fork
   difference(){
      translate([0,-ith/2-wall[1]+(idlerclamps?1:0),wall[2]-eh-0.01])cube([ml2-idl,ith+2*wall[1]-(idlerclamps?2:0),xrod+eh+0.02]);
      translate([2*wall[0],-ith/2-idg,wall[2]])cube([ml2-idl-2*wall[0]+1,ith+2*idg,xrod]);
      translate([-1,0,d1/2])rotate([0,90,0])cylinder(r=ids/2,h=2*wall[0]+2);
   }

    
   // build separate interlocking z-carriage part
   if(zcarriage)translate([-2*lm8uu,h1/3,0]) rotate(90)zcarriage(hole=true);
}

///////////////////////////////////////////////////////////////////////////////
// local module to build the X-endstop
///////////////////////////////////////////////////////////////////////////////
module endstop(){
   difference(){
      union(){
         // main body upper part
         translate([0,-h1/2,0]) chamfered_cube([esl,h1,d1+m3nh+wall[2]]);
      }

      for(sy=[-1,1])scale([1,sy,1]){
         // x-rod holes
         translate([-1,xdist/2,d1/2])rotate([0,90,0])
            rotate(22.5)cylinder(r=xrod/2/cos(22.5),h=esl+2,$fn=8);
         // x-rod nut cavities
         hull()for(x=[0,esl/2])translate([x,xdist/2,d1-1])
            rotate(30)cylinder(r=m3n/2/cos(30)+(x?0.2:0),h=m3nh,$fn=6);
         // x-rod clamping screw holes - lower part
         translate([esl/2,xdist/2,d1-wall[2]])cylinder(r=m3/2,h=wall[2],$fn=6);
         // x-rod clamping screw holes - upper part
         translate([esl/2,xdist/2,d1+m3nh-1+eh])cylinder(r=m3/2,h=wall[2]+2,$fn=6);
         // end switch screw slots
         for(i=[0:1])translate([esl/2-m3/2,i*esd+esd/8,d1+m3nh])
            cube([m3,0.75*esd,wall[2]+1]);
         translate([esl/2,-xdist/2+xrod/2+wall[1]+0.5,0])cylinder(r1=0,r2=m3+1,h=d1+m3nh-0.01);
      }
         
      // belt channel 
      translate([-1,-xdist/2+xrod/2+wall[1],-1])
         cube([ml2+2,xdist-xrod-2*wall[1],xrod+2*wall[2]+m3nh+1]);
      translate([esl/2-m3/2,-motor_s/2,d1+m3nh-eh])
         cube([m3,motor_s,3*eh]);
   }
   // bridging support  
   if(support)color("red")hull(){
      translate([2,-2,0])cube([esl-4,4,1]);
      translate([-1,-ew/2,d1+m3nh-1])cube([esl+2,ew,1]);
   }

}
   
//  now build the desired part(s)

if(motorend)motorend();

if(endstop && !motorend)endstop();

if(idlerend)
   scale([-1,1,1])idlerend();
if(idler)
   translate([35,20,0])rotate(180)idler();

if(zcarriage && !motorend && !idlerend && !endstop &&!idler)zcarriage();

}

//////////////////////////////////////////////////////////////////////////////
///  Modules for automatic building of specific STL file via Makefile
//////////////////////////////////////////////////////////////////////////////

module motorxend(){ // AUTO_MAKE_STL
   i3_xend(motorend=true,idlerend=false,idler=false);
}

module motorxend_zendstop(){ // AUTO_MAKE_STL
   i3_xend(motorend=true,idlerend=false,idler=false,endstop=true);
}

module idlerxend(){ // AUTO_MAKE_STL
   i3_xend(motorend=false,idlerend=true,idler=false);
}

module idlerxend_xrodclamps(){ // AUTO_MAKE_STL
   i3_xend(motorend=false,idlerend=true,idler=false,idlerclamps=true);
}

module xendstop(){ // AUTO_MAKE_STL
   i3_xend(motorend=false,idlerend=false,idler=false,endstop=true);
}

module idler2x625(){ // AUTO_MAKE_STL
   i3_xend(motorend=false,idlerend=false,idler=true,bearing=[5,17,11]);
}

module idler2x624(){ // AUTO_MAKE_STL
   i3_xend(motorend=false,idlerend=false,idler=true,bearing=[4,14,11]);
}

module idler2x623(){ // AUTO_MAKE_STL
   i3_xend(motorend=false,idlerend=false,idler=true,bearing=[3,11,9]);
}

module idler2x604(){ // AUTO_MAKE_STL
   i3_xend(motorend=false,idlerend=false,idler=true,bearing=[4,13,9]);
}

module idler608(){ // AUTO_MAKE_STL
   i3_xend(motorend=false,idlerend=false,idler=true,bearing=[8,18,8]);
}

//////////////////////////////////////////////////////////////////////////////
///  Uncomment as needed for manual printing
//////////////////////////////////////////////////////////////////////////////

//i3_xend(motorend=false,idlerend=true,idler=false,support=true,zcarriage=false,idlerclamps=true);
//scale([-1,1,1])i3_xend(motorend=false,idlerend=false,idler=false,support=false,zcarriage=true,idlerclamps=false);
//idlerxend();
//motorxend();
//motorxend_zendstop();
idlerxend_xrodclamps();
//xendstop();
//idler2x625();
//idler2x623();
//idler2x604();
//idler608();
//
/// show all in print position:
//motorxend_zendstop();
//translate([55,0,0])xendstop();
//translate([120,0,0])idlerxend();
//translate([110,-45,0])rotate(180)idler2x604();
//
/// show all in working position:
//rotate(180)translate([30,90,0])
//{translate([-50,0,0])i3_xend(motorend=true,idlerend=false,idler=false,support=false,zcarriage=false);
//translate([85,0,0])i3_xend(motorend=false,idlerend=true,idler=false,support=false,zcarriage=false);
//i3_xend(motorend=false,idlerend=false,endstop=true,support=false,zcarriage=false);}
//translate([-50,0,0])i3_xend(motorend=true,idlerend=false,idler=false,support=false,zcarriage=false);
//translate([85,0,0])i3_xend(motorend=false,idlerend=true,idler=false,support=false,zcarriage=false);
//i3_xend(motorend=false,idlerend=false,endstop=true,support=false,zcarriage=false);
